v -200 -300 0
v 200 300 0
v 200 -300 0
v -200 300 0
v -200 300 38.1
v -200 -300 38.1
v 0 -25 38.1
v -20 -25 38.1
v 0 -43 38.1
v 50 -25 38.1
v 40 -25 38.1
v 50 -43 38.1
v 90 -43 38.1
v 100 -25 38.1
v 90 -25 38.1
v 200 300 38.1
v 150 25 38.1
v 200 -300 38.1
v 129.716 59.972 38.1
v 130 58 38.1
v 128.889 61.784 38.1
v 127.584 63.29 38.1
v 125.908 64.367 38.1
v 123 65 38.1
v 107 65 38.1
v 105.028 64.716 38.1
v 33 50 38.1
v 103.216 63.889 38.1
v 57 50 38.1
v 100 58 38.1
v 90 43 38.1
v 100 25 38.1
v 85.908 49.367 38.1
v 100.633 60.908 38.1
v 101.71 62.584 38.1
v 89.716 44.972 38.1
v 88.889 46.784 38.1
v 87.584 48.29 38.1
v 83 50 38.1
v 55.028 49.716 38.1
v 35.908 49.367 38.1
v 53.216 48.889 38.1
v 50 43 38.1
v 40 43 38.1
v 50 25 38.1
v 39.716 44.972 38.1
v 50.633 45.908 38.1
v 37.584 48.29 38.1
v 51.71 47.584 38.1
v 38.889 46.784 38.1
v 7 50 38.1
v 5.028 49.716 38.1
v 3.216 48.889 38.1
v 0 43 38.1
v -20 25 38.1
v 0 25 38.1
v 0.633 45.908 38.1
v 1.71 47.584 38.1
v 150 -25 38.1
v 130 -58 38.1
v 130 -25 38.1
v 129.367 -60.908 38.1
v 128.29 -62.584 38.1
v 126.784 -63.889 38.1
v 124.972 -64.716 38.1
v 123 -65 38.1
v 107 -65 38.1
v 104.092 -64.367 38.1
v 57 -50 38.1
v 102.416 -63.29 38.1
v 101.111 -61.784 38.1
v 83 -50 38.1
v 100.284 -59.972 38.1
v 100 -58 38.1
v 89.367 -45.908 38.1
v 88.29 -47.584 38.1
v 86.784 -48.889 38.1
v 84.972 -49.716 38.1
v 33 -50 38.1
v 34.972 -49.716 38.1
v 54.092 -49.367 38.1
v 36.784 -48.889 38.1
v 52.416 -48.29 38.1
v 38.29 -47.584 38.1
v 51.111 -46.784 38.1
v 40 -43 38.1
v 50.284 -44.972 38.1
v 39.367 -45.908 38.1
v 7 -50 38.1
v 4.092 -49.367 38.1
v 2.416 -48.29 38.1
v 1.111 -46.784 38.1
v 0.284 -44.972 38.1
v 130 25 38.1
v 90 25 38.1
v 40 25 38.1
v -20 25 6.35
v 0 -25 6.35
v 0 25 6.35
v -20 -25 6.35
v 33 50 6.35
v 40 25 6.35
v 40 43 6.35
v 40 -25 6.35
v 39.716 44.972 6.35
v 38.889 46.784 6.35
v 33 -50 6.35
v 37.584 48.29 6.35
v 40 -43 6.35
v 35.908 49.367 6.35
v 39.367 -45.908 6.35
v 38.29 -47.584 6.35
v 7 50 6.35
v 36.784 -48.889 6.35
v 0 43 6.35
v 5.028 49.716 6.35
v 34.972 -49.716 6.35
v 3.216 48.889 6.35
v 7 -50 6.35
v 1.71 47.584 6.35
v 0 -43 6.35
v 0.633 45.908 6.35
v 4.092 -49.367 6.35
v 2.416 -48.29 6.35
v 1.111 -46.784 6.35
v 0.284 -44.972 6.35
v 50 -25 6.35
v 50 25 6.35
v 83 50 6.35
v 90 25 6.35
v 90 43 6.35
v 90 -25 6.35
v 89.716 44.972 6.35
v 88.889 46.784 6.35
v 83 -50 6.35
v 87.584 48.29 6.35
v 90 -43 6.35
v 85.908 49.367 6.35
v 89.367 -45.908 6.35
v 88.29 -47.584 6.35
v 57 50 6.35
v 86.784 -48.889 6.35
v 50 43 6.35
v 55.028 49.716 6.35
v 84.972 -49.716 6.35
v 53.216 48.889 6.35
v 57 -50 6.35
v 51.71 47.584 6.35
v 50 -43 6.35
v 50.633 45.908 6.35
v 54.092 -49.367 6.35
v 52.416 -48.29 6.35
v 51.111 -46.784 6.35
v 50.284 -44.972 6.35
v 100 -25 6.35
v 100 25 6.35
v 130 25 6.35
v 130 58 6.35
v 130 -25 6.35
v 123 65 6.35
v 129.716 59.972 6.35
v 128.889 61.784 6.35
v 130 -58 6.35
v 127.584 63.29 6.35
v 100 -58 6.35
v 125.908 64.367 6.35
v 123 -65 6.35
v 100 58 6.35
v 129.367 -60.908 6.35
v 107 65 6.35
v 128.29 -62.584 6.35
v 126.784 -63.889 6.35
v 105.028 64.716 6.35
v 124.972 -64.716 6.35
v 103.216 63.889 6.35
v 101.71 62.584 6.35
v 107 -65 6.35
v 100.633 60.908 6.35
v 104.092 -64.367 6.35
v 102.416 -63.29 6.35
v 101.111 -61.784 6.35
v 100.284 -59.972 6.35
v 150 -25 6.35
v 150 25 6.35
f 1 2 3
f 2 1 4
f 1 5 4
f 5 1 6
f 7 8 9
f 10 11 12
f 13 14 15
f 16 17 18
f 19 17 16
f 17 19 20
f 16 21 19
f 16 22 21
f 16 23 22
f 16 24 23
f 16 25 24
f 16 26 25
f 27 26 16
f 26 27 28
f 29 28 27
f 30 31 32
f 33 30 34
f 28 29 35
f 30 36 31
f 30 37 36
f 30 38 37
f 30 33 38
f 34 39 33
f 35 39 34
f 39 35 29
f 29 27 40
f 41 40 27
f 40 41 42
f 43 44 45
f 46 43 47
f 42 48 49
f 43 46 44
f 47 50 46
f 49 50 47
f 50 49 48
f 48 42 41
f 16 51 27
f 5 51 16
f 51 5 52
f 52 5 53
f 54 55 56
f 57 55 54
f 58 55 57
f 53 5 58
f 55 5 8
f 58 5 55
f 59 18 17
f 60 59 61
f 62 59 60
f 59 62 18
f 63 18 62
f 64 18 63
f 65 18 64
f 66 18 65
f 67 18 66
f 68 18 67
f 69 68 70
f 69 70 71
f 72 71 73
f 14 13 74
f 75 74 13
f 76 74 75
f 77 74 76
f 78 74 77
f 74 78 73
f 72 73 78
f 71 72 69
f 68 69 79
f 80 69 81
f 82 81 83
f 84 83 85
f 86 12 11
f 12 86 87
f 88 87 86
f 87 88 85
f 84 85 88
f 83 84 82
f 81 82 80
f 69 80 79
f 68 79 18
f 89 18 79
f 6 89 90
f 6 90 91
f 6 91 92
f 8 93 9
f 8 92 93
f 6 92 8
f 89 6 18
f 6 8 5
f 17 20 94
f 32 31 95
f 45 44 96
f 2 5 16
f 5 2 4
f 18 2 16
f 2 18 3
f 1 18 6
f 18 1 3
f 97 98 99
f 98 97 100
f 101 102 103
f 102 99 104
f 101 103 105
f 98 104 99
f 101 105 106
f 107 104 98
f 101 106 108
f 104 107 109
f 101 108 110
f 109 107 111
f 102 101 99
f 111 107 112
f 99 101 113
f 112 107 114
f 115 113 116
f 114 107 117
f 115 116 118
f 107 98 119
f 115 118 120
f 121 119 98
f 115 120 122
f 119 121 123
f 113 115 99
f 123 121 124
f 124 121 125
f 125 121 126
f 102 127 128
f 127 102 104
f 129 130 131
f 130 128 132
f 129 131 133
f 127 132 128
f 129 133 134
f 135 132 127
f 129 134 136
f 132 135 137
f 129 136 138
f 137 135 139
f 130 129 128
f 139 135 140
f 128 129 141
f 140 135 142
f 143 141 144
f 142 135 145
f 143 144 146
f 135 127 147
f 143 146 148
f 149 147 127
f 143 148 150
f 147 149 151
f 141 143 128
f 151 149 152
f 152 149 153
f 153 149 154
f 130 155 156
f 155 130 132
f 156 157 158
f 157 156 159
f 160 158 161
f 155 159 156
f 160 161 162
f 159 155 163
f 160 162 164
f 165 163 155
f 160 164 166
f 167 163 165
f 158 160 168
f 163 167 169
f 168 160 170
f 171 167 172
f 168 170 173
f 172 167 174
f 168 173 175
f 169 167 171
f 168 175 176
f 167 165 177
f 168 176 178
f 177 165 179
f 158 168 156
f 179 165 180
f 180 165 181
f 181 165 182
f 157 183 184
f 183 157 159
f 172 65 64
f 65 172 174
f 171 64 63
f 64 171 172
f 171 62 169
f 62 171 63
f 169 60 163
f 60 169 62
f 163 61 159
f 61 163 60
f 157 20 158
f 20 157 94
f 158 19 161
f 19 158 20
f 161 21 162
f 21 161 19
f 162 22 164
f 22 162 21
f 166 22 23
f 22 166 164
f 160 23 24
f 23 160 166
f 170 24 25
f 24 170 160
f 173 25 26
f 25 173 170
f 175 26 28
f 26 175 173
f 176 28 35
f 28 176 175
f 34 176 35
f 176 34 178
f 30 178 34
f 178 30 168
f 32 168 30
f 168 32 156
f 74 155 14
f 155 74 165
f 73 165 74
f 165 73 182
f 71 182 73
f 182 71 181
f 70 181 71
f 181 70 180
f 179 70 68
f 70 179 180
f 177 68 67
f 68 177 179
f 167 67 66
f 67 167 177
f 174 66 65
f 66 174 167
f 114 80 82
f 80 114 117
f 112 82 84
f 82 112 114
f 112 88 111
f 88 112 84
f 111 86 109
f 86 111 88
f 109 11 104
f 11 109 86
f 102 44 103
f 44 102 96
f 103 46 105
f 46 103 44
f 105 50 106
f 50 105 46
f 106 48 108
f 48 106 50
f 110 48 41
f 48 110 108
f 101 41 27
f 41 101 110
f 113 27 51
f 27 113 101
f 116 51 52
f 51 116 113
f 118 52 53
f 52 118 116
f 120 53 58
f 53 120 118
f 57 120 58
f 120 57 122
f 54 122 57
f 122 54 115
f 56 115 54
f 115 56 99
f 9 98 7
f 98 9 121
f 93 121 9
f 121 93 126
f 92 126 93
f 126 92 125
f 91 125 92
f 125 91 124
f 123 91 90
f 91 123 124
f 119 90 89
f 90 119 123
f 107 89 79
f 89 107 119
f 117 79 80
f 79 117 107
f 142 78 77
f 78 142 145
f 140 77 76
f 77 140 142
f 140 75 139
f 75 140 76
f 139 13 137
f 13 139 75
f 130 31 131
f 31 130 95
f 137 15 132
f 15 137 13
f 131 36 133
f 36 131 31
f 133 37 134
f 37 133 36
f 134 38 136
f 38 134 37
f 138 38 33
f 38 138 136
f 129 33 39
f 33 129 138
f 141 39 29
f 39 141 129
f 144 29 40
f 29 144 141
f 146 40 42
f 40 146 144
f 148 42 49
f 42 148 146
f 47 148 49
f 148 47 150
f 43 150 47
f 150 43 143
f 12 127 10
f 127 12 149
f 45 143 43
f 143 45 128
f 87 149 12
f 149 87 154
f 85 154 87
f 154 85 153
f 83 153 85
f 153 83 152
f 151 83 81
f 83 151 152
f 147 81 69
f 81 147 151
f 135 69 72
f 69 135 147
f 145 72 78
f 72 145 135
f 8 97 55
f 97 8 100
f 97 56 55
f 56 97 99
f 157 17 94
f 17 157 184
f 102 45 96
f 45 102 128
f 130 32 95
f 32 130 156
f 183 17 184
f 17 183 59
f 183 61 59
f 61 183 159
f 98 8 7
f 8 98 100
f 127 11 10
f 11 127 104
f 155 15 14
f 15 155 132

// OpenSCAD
in=25.4;
drawer_x=400;
drawer_y=600;
drawer_h=1.5*in;
base=in/4;

divider=10;

grip_h=drawer_h-base;
grip_y=50;
grip_x=divider*2;


default_r=7;



module tray(display,x,y,r=default_r) {

    translate([x/2,0])
    if(display=="inside") {
        offset(r)
        square([x-r*2,y-r*2],center=true);
    } else if(display=="grip") {
        square([x+grip_x*2,grip_y],center=true);
    }

    translate([x+divider,0])
    children();
}

module drawer() {
    square([drawer_x,drawer_y],center=true);
}

module trays(display="inside") {
    tray(display,40,100)
    tray(display,40,100)
    tray(display,30,130);
}

module assembled() {
    difference() {
        linear_extrude(height=drawer_h)
        drawer();
        translate([0,0,base])
        linear_extrude(height=drawer_h)
        trays();

        translate([0,0,drawer_h-grip_h])
        linear_extrude(height=drawer_h)
        trays("grip");
    }   
}

assembled();
